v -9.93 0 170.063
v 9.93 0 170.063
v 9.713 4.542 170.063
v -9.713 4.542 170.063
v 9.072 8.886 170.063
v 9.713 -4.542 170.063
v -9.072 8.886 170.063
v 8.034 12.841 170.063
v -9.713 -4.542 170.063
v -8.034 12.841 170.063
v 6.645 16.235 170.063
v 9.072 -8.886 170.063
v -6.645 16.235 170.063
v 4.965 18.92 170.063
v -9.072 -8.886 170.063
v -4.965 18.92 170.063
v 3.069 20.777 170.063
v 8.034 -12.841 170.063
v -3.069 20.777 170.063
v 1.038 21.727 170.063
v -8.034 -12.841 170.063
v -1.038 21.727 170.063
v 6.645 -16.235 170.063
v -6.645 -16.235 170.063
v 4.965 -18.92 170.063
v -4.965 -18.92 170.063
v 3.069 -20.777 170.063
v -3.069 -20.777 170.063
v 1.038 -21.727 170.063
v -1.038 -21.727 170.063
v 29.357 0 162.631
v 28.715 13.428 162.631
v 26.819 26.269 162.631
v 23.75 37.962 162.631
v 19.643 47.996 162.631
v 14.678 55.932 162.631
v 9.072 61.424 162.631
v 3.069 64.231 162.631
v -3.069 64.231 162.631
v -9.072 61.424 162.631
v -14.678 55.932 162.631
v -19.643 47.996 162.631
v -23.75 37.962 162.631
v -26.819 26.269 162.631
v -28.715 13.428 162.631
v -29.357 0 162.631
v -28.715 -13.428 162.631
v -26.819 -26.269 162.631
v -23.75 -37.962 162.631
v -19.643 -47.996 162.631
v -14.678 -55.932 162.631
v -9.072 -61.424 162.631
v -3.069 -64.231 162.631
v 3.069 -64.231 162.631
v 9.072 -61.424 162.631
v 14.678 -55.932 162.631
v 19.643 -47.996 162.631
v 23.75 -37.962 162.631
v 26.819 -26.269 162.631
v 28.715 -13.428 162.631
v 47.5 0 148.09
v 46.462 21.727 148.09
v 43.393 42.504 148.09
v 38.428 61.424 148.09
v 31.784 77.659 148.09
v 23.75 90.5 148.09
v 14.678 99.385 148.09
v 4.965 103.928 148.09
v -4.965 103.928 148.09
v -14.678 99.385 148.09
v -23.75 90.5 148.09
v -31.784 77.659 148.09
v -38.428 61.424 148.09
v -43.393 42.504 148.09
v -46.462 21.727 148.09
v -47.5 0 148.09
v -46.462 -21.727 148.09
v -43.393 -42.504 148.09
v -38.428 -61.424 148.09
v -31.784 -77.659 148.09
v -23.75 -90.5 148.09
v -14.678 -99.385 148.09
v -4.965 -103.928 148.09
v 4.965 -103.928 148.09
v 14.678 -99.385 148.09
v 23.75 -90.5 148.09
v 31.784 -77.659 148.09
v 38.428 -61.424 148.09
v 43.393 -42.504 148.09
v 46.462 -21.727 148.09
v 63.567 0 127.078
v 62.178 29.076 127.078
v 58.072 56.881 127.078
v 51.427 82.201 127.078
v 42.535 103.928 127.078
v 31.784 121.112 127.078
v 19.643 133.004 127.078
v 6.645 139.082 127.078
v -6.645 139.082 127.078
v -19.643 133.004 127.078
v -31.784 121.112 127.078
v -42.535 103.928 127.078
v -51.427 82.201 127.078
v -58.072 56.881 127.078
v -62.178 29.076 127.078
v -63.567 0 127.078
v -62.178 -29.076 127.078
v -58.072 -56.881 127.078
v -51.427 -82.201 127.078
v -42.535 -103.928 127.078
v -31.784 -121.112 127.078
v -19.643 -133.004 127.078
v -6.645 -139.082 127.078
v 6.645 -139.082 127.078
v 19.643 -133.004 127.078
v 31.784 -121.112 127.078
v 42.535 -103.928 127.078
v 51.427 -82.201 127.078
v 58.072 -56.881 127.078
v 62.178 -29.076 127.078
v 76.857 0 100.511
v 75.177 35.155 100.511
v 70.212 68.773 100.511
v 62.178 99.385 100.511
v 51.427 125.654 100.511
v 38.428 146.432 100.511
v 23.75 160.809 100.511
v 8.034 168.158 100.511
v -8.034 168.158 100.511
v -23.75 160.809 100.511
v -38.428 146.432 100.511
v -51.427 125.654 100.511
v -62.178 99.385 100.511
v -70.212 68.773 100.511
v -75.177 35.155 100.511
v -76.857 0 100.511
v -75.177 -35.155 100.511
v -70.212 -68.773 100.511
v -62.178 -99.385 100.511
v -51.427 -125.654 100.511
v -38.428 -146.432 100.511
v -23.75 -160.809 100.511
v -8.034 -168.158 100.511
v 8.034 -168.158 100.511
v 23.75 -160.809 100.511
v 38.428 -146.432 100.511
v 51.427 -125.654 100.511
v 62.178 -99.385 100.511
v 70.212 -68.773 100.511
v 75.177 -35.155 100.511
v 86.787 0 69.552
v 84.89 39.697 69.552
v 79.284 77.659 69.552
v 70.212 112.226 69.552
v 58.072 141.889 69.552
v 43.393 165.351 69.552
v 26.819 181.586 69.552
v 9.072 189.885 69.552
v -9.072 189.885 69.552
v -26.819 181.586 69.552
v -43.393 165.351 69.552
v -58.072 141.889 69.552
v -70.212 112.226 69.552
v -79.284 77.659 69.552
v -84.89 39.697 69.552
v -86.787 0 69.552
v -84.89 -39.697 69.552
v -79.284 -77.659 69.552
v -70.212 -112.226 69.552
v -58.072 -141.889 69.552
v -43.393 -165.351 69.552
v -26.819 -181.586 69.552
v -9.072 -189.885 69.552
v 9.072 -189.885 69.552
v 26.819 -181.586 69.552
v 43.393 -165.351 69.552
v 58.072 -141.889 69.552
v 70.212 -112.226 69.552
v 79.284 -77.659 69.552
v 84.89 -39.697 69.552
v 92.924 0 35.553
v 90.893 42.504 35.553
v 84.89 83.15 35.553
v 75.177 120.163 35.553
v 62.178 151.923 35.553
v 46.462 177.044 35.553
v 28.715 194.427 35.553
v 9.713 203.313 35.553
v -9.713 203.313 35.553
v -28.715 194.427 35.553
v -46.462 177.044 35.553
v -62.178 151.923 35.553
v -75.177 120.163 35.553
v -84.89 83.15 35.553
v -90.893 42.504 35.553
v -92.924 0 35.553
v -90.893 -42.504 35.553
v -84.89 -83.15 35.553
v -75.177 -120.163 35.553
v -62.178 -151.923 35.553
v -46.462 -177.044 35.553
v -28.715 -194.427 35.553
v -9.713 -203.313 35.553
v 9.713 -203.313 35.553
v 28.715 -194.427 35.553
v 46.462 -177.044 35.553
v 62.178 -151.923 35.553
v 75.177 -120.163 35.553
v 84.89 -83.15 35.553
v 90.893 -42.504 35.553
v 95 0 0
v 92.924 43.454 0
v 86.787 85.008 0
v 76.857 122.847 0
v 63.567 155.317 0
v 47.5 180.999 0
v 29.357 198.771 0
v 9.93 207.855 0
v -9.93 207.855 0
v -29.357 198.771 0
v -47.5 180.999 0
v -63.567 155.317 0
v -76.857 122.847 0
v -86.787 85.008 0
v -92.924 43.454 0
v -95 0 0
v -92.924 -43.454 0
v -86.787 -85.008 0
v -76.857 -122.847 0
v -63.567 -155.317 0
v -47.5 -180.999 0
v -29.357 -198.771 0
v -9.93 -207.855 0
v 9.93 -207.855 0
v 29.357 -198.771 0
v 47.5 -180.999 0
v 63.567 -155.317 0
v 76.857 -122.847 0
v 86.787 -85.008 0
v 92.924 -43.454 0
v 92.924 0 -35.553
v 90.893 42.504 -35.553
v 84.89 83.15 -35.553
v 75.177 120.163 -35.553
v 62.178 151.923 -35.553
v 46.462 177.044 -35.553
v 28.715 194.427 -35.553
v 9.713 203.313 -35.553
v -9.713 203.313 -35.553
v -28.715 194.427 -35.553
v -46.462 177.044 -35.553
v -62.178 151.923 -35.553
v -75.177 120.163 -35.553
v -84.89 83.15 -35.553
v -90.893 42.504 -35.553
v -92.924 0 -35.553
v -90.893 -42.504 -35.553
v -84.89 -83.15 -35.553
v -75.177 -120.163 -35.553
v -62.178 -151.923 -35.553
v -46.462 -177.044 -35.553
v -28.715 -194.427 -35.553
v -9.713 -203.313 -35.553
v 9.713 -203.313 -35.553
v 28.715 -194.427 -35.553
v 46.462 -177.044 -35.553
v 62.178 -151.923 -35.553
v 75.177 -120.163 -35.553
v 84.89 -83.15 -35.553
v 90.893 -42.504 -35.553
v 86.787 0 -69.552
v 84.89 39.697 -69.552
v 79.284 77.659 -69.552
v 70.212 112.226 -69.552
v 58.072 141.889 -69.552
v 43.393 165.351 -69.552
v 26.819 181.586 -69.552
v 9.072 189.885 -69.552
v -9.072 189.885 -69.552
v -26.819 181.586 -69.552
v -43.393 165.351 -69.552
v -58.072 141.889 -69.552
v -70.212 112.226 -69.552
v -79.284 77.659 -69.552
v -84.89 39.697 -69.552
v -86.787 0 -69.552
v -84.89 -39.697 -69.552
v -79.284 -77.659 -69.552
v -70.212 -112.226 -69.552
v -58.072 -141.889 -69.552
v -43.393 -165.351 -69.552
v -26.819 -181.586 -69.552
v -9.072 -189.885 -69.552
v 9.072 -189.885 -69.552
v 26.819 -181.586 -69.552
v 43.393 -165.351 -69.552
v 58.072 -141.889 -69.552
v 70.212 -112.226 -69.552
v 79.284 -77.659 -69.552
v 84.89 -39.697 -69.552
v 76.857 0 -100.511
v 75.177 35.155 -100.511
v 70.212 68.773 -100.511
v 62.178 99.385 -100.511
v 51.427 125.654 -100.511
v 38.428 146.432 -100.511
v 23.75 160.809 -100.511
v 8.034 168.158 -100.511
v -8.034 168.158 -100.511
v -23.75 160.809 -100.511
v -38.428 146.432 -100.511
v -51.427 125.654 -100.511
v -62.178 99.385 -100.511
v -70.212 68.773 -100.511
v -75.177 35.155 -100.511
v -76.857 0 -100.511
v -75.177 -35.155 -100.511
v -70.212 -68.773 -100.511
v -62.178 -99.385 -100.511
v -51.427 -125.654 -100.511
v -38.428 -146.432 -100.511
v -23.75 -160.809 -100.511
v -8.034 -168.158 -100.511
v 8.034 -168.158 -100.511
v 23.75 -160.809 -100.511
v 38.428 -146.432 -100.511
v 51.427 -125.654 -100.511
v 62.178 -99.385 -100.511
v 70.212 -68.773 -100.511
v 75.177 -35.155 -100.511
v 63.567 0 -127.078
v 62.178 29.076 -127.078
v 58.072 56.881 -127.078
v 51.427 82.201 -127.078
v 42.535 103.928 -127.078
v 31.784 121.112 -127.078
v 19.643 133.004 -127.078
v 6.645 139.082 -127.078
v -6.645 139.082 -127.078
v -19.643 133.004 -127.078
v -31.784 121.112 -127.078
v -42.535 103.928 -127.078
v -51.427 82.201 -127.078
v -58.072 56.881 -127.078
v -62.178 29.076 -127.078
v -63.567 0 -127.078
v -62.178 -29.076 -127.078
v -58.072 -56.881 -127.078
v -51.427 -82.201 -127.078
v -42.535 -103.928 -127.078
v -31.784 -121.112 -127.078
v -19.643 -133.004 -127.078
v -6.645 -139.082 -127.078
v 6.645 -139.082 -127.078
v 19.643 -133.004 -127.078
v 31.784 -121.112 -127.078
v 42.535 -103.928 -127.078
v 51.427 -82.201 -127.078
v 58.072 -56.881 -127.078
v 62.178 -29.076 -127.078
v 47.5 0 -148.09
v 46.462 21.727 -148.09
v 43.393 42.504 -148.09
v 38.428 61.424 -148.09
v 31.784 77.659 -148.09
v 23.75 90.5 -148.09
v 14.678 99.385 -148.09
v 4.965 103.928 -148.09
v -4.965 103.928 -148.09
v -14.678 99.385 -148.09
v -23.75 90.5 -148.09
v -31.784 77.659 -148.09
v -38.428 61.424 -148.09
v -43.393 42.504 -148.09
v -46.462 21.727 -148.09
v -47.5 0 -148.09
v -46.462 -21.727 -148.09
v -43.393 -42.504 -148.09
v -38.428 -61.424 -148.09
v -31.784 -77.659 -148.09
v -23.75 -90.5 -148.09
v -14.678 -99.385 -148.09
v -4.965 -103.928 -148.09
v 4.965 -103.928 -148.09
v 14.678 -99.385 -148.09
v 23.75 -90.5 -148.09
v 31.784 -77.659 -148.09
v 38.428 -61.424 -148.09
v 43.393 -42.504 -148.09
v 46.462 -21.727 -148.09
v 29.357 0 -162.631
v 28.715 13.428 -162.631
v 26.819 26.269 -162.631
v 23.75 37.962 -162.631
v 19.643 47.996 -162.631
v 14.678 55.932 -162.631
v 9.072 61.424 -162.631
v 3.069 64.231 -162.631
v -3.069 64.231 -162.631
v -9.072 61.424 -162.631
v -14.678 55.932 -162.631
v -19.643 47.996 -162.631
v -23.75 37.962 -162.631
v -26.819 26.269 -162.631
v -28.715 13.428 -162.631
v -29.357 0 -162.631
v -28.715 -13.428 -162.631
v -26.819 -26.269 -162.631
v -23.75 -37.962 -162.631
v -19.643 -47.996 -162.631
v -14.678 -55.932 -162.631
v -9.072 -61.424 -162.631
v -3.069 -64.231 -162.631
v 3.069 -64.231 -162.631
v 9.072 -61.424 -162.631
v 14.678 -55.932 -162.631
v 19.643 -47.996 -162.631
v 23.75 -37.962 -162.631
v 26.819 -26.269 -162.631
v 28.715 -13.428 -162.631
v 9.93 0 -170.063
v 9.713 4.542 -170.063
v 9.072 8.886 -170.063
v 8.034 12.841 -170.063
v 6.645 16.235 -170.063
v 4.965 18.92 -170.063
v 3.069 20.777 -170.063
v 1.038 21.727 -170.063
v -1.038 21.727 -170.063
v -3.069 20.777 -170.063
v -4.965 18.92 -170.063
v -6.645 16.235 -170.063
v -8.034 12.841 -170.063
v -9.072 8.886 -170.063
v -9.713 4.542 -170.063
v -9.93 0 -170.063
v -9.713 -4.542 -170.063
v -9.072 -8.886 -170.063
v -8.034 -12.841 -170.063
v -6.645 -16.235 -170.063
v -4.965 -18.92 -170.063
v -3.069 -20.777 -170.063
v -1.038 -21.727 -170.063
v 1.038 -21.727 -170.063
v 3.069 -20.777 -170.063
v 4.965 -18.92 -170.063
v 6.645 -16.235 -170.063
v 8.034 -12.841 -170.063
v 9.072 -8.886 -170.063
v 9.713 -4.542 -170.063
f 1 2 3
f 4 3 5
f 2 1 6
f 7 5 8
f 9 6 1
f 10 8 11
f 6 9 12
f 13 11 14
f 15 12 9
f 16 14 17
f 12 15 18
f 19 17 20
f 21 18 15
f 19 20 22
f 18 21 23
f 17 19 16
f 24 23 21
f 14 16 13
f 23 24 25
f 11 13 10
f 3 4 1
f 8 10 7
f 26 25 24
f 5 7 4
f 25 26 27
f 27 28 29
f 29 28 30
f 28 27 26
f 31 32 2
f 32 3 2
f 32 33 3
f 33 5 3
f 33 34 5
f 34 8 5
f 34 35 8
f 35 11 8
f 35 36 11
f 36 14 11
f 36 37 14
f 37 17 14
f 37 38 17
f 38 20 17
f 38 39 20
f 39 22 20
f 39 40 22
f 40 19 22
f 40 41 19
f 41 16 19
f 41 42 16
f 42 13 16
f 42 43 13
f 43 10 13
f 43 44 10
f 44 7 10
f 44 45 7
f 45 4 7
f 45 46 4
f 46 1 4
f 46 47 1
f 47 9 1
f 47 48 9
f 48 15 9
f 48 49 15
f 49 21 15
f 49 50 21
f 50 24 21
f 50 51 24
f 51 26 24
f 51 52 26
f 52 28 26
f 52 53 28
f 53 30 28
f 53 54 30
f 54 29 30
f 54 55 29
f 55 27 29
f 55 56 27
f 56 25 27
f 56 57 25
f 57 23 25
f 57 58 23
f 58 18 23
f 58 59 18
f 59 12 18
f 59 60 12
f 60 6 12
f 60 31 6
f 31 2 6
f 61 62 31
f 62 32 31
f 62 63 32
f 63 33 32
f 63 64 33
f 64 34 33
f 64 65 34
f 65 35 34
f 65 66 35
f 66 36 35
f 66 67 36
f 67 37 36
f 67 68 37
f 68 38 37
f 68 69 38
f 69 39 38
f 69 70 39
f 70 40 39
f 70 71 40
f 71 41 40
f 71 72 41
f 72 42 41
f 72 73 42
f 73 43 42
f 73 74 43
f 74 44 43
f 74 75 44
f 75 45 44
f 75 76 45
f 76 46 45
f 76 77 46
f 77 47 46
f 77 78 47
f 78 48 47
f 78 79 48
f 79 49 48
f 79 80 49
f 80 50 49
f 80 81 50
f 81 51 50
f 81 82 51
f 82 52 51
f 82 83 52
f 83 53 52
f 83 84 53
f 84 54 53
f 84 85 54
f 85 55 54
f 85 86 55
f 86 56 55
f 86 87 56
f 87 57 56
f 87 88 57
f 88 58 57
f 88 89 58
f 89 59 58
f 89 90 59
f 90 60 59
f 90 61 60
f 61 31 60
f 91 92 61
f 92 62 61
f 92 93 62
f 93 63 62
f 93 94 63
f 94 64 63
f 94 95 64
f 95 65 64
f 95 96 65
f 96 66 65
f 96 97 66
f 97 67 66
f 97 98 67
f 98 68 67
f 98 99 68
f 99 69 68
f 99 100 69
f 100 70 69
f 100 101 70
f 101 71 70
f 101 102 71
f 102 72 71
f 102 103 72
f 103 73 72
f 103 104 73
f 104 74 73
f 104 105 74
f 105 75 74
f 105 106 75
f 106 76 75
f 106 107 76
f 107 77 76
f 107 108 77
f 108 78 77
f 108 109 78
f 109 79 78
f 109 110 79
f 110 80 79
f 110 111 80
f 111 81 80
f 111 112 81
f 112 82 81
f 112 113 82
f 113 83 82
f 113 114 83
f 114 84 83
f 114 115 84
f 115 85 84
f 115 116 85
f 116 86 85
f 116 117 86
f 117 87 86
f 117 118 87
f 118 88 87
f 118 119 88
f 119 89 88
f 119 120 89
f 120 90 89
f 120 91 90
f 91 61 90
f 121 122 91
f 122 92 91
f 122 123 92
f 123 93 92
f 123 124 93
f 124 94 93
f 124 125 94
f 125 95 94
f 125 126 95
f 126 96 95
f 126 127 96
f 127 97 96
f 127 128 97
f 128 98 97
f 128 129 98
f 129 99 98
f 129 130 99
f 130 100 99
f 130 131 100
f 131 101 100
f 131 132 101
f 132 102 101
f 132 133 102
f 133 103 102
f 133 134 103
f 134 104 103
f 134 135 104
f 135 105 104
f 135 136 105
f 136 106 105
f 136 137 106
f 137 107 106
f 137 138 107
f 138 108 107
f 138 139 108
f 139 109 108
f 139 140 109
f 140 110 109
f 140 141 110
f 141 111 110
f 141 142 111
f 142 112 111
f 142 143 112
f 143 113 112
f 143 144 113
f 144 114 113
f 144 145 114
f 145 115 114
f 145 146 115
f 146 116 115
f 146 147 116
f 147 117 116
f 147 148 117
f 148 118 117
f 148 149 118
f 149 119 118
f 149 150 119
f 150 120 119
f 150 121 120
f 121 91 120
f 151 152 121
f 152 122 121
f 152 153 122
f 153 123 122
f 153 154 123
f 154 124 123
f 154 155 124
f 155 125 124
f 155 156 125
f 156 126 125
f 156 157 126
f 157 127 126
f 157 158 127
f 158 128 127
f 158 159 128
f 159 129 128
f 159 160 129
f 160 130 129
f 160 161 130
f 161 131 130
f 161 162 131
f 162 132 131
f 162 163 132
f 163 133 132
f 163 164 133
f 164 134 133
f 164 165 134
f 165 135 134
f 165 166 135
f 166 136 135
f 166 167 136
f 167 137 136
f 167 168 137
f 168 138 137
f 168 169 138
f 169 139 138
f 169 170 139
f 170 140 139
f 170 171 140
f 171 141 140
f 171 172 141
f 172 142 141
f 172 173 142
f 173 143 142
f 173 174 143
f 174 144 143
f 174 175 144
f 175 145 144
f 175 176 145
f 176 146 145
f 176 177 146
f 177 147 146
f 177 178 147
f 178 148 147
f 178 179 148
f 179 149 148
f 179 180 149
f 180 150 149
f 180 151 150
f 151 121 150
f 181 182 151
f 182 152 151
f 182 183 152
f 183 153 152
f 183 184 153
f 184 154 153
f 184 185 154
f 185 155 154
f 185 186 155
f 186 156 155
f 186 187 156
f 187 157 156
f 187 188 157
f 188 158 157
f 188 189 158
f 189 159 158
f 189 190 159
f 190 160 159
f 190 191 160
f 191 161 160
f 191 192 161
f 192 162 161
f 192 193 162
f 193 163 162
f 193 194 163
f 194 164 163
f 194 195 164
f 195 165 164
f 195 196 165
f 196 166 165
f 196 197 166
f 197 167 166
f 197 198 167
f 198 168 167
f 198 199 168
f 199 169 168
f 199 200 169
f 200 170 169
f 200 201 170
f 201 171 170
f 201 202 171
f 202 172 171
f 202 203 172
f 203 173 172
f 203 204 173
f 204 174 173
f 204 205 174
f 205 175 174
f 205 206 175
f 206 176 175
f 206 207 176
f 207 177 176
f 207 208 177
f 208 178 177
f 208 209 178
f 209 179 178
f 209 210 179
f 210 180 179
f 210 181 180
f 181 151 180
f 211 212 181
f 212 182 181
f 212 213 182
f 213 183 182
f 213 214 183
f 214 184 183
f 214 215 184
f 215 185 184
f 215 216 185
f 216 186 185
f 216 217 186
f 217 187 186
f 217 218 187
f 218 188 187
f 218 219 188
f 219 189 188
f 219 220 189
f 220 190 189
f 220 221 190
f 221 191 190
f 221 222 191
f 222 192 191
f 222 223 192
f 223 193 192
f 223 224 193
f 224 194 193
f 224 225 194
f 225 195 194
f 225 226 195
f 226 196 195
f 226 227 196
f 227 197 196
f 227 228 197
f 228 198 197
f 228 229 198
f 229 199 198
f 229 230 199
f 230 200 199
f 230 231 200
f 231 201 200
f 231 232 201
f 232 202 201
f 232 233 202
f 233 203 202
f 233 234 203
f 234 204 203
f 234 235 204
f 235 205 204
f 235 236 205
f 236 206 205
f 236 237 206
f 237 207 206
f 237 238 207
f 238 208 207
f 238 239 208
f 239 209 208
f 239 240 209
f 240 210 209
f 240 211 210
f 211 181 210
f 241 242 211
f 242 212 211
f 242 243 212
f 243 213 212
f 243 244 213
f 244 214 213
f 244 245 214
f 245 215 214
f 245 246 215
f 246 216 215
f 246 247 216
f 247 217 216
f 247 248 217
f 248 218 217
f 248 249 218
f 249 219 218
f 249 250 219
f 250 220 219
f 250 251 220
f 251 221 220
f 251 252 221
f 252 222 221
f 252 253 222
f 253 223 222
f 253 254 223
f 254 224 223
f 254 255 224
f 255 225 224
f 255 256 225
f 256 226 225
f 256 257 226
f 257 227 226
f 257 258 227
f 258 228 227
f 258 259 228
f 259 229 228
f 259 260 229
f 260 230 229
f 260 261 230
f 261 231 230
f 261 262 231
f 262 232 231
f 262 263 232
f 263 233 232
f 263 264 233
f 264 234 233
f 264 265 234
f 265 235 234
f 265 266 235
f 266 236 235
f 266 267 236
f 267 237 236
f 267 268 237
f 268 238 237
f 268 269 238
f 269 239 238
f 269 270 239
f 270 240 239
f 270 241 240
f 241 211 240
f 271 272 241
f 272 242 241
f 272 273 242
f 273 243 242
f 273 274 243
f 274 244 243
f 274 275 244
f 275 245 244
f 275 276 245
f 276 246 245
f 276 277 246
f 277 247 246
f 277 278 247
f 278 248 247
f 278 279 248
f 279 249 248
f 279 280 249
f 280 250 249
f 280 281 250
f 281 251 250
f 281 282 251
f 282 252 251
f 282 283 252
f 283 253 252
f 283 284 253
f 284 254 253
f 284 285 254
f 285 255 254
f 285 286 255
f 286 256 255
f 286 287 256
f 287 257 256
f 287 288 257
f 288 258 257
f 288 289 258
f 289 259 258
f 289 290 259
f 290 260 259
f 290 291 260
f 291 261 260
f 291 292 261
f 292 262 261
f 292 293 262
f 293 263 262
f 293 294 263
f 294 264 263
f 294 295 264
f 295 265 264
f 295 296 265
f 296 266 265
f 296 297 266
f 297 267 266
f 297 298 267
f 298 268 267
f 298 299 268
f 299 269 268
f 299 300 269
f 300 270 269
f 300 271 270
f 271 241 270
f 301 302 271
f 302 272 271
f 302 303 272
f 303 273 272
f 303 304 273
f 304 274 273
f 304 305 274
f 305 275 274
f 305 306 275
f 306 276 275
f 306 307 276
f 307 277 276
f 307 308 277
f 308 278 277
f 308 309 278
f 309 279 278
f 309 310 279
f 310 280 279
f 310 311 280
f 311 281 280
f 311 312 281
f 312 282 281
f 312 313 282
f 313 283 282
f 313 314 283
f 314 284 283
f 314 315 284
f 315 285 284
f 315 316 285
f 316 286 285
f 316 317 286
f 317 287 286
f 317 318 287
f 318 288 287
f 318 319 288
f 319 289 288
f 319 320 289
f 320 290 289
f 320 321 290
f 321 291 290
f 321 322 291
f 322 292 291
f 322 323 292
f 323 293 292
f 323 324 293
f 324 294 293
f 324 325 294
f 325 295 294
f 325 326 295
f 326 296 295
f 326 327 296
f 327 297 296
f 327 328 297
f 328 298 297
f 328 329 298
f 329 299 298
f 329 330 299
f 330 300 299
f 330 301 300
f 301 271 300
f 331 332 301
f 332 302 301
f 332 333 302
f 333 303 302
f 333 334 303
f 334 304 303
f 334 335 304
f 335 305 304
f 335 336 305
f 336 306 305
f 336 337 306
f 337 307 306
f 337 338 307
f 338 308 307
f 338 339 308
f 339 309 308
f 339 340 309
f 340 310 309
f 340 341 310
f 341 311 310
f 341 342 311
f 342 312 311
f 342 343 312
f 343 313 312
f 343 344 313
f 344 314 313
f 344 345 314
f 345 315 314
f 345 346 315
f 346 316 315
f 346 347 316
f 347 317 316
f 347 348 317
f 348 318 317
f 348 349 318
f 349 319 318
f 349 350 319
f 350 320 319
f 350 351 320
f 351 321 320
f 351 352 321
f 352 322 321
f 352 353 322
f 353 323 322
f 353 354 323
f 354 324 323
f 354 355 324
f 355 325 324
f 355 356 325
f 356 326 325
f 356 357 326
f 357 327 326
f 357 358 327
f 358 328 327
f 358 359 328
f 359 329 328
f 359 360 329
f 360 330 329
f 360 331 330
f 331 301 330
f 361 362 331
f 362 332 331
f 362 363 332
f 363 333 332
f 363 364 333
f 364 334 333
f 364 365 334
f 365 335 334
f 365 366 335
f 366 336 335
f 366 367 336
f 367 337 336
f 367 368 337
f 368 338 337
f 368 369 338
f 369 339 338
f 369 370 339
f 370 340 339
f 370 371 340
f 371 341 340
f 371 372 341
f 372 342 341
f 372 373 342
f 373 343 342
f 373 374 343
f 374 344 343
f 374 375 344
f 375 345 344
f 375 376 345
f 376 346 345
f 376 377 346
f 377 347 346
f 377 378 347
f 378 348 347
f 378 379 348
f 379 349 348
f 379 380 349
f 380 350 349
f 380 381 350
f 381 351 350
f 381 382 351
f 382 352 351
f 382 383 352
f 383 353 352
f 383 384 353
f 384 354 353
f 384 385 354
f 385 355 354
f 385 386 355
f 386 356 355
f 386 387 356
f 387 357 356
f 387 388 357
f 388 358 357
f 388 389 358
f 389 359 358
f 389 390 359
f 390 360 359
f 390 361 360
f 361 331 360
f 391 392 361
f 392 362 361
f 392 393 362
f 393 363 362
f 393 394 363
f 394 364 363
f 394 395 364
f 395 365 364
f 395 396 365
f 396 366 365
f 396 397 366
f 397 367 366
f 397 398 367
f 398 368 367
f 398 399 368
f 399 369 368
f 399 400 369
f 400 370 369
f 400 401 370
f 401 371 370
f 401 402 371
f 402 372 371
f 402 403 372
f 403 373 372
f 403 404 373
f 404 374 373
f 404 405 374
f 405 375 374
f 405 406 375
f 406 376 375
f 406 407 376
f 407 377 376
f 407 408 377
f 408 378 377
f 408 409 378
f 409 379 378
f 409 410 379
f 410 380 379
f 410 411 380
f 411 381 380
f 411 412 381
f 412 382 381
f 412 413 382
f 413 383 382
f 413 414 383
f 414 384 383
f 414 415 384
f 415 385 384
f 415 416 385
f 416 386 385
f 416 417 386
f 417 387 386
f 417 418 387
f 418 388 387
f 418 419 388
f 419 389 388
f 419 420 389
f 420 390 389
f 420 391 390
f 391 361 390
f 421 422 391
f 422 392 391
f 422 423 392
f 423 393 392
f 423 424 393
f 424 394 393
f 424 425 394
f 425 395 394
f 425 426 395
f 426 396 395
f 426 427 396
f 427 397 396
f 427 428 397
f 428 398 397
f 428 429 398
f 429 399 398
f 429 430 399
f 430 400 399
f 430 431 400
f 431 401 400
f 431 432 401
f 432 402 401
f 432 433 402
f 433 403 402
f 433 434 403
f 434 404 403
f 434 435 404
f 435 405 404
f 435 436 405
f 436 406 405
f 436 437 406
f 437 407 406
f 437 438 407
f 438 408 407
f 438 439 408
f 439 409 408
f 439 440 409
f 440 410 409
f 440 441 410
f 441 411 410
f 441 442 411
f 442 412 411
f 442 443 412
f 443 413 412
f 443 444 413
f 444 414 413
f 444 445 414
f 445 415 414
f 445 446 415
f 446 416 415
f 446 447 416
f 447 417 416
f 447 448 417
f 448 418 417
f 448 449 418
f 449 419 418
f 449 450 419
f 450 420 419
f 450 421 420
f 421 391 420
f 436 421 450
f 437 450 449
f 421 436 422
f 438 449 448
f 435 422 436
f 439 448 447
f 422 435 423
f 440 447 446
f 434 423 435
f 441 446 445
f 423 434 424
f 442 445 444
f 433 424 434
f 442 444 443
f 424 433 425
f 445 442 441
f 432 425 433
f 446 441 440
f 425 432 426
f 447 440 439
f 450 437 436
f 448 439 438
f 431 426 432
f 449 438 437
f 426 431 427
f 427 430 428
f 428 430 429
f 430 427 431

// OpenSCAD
// Generated by SolidPython 1.0.1 on 2020-07-29 00:46:46


scale(v = [5, 11, 9]) {
	sphere(r = 19);
}
/***********************************************
*********      SolidPython code:      **********
************************************************
 
# import packages: SolidPython
from solid import *
from solid.utils import *
from itertools import chain, combinations, permutations


class Resize:

    def __init__(self, scad_file):
        self.scad_file = scad_file
        #self.scad_file = import_scad(scad_file)
        # cone/cylinder param:
        self.r1 = 0
        self.r2 = 0
        self.h = 0
        # rectangular prism param:
        self.w = 0
        self.l = 0
        # ellipse param:
        self.r = 0

    # import OpenScad code (file name corresponds to shape)


    # classify shape + parameters
    def assign(self, param1, param2, param3):
        if self.scad_file == 'cone.scad':
            self.r1 = param1
            self.r2 = param2
            self.h = param3
        elif self.scad_file == 'cylinder.scad':
            self.r1 = param1
            self.r2 = param2
            self.h = param3
        elif self.scad_file == 'rectangularPrism.scad':
            self.h = param1
            self.l = param2
            self.w = param3
        else:
            self.r = param1
            self.h = param2

    # resize parameters
    def iterate(self):
        x = range(3, 20, 2)
        i = 1
        if self.scad_file == 'cone.scad':
            tempList = list(permutations(x, 2))
            for temp in tempList:
                param1 = temp[0]
                param2 = temp[1]
                filepath = 'produced_scad_files/' + 'cone' + str(param1) + '_' + str(param2) + '_' + '.scad'
                scad_render_to_file(cylinder(h=param1, r1=param2, r2=0), filepath)

        elif self.scad_file == 'cylinder.scad':
            tempList = list(permutations(x, 3))
            for temp in tempList:
                param1 = temp[0]
                param2 = temp[1]
                filepath = 'produced_scad_files/' + 'cylinder' + str(param1) + '_' + str(param2) + '_' + '.scad'
                scad_render_to_file(cylinder(h=param1, r1=param2, r2=param2), filepath)

        elif self.scad_file == 'rectangularPrism.scad':
            tempList = list(permutations(x, 3))
            for temp in tempList:
                param1 = temp[0]
                param2 = temp[1]
                param3 = temp[2]
                filepath = 'produced_scad_files/' + 'rectangularPrism' + str(param1) + '_' + str(param2) + '_' + str(
                    param3) + '.scad'
                scad_render_to_file(cube(size=(param1, param2, param3)), filepath)

        elif self.scad_file == 'ellipse.scad':
            tempList = list(permutations(x, 4))
            for temp in tempList:
                param1 = temp[0]
                param2 = temp[1]
                param3 = temp[2]
                param4 = temp[3]
                filepath = 'produced_scad_files/' + 'ellipse' + str(param1) + '_' + str(param2) + '_' + str(param3) + '_' + str(param4) + '.scad'
                scad_render_to_file(scale([param1, param2, param3])(sphere(r=param4)), filepath)

    def render_to_scadfile(self):
        scad_render_to_file(scad, 'example.scad') 
 
************************************************/
